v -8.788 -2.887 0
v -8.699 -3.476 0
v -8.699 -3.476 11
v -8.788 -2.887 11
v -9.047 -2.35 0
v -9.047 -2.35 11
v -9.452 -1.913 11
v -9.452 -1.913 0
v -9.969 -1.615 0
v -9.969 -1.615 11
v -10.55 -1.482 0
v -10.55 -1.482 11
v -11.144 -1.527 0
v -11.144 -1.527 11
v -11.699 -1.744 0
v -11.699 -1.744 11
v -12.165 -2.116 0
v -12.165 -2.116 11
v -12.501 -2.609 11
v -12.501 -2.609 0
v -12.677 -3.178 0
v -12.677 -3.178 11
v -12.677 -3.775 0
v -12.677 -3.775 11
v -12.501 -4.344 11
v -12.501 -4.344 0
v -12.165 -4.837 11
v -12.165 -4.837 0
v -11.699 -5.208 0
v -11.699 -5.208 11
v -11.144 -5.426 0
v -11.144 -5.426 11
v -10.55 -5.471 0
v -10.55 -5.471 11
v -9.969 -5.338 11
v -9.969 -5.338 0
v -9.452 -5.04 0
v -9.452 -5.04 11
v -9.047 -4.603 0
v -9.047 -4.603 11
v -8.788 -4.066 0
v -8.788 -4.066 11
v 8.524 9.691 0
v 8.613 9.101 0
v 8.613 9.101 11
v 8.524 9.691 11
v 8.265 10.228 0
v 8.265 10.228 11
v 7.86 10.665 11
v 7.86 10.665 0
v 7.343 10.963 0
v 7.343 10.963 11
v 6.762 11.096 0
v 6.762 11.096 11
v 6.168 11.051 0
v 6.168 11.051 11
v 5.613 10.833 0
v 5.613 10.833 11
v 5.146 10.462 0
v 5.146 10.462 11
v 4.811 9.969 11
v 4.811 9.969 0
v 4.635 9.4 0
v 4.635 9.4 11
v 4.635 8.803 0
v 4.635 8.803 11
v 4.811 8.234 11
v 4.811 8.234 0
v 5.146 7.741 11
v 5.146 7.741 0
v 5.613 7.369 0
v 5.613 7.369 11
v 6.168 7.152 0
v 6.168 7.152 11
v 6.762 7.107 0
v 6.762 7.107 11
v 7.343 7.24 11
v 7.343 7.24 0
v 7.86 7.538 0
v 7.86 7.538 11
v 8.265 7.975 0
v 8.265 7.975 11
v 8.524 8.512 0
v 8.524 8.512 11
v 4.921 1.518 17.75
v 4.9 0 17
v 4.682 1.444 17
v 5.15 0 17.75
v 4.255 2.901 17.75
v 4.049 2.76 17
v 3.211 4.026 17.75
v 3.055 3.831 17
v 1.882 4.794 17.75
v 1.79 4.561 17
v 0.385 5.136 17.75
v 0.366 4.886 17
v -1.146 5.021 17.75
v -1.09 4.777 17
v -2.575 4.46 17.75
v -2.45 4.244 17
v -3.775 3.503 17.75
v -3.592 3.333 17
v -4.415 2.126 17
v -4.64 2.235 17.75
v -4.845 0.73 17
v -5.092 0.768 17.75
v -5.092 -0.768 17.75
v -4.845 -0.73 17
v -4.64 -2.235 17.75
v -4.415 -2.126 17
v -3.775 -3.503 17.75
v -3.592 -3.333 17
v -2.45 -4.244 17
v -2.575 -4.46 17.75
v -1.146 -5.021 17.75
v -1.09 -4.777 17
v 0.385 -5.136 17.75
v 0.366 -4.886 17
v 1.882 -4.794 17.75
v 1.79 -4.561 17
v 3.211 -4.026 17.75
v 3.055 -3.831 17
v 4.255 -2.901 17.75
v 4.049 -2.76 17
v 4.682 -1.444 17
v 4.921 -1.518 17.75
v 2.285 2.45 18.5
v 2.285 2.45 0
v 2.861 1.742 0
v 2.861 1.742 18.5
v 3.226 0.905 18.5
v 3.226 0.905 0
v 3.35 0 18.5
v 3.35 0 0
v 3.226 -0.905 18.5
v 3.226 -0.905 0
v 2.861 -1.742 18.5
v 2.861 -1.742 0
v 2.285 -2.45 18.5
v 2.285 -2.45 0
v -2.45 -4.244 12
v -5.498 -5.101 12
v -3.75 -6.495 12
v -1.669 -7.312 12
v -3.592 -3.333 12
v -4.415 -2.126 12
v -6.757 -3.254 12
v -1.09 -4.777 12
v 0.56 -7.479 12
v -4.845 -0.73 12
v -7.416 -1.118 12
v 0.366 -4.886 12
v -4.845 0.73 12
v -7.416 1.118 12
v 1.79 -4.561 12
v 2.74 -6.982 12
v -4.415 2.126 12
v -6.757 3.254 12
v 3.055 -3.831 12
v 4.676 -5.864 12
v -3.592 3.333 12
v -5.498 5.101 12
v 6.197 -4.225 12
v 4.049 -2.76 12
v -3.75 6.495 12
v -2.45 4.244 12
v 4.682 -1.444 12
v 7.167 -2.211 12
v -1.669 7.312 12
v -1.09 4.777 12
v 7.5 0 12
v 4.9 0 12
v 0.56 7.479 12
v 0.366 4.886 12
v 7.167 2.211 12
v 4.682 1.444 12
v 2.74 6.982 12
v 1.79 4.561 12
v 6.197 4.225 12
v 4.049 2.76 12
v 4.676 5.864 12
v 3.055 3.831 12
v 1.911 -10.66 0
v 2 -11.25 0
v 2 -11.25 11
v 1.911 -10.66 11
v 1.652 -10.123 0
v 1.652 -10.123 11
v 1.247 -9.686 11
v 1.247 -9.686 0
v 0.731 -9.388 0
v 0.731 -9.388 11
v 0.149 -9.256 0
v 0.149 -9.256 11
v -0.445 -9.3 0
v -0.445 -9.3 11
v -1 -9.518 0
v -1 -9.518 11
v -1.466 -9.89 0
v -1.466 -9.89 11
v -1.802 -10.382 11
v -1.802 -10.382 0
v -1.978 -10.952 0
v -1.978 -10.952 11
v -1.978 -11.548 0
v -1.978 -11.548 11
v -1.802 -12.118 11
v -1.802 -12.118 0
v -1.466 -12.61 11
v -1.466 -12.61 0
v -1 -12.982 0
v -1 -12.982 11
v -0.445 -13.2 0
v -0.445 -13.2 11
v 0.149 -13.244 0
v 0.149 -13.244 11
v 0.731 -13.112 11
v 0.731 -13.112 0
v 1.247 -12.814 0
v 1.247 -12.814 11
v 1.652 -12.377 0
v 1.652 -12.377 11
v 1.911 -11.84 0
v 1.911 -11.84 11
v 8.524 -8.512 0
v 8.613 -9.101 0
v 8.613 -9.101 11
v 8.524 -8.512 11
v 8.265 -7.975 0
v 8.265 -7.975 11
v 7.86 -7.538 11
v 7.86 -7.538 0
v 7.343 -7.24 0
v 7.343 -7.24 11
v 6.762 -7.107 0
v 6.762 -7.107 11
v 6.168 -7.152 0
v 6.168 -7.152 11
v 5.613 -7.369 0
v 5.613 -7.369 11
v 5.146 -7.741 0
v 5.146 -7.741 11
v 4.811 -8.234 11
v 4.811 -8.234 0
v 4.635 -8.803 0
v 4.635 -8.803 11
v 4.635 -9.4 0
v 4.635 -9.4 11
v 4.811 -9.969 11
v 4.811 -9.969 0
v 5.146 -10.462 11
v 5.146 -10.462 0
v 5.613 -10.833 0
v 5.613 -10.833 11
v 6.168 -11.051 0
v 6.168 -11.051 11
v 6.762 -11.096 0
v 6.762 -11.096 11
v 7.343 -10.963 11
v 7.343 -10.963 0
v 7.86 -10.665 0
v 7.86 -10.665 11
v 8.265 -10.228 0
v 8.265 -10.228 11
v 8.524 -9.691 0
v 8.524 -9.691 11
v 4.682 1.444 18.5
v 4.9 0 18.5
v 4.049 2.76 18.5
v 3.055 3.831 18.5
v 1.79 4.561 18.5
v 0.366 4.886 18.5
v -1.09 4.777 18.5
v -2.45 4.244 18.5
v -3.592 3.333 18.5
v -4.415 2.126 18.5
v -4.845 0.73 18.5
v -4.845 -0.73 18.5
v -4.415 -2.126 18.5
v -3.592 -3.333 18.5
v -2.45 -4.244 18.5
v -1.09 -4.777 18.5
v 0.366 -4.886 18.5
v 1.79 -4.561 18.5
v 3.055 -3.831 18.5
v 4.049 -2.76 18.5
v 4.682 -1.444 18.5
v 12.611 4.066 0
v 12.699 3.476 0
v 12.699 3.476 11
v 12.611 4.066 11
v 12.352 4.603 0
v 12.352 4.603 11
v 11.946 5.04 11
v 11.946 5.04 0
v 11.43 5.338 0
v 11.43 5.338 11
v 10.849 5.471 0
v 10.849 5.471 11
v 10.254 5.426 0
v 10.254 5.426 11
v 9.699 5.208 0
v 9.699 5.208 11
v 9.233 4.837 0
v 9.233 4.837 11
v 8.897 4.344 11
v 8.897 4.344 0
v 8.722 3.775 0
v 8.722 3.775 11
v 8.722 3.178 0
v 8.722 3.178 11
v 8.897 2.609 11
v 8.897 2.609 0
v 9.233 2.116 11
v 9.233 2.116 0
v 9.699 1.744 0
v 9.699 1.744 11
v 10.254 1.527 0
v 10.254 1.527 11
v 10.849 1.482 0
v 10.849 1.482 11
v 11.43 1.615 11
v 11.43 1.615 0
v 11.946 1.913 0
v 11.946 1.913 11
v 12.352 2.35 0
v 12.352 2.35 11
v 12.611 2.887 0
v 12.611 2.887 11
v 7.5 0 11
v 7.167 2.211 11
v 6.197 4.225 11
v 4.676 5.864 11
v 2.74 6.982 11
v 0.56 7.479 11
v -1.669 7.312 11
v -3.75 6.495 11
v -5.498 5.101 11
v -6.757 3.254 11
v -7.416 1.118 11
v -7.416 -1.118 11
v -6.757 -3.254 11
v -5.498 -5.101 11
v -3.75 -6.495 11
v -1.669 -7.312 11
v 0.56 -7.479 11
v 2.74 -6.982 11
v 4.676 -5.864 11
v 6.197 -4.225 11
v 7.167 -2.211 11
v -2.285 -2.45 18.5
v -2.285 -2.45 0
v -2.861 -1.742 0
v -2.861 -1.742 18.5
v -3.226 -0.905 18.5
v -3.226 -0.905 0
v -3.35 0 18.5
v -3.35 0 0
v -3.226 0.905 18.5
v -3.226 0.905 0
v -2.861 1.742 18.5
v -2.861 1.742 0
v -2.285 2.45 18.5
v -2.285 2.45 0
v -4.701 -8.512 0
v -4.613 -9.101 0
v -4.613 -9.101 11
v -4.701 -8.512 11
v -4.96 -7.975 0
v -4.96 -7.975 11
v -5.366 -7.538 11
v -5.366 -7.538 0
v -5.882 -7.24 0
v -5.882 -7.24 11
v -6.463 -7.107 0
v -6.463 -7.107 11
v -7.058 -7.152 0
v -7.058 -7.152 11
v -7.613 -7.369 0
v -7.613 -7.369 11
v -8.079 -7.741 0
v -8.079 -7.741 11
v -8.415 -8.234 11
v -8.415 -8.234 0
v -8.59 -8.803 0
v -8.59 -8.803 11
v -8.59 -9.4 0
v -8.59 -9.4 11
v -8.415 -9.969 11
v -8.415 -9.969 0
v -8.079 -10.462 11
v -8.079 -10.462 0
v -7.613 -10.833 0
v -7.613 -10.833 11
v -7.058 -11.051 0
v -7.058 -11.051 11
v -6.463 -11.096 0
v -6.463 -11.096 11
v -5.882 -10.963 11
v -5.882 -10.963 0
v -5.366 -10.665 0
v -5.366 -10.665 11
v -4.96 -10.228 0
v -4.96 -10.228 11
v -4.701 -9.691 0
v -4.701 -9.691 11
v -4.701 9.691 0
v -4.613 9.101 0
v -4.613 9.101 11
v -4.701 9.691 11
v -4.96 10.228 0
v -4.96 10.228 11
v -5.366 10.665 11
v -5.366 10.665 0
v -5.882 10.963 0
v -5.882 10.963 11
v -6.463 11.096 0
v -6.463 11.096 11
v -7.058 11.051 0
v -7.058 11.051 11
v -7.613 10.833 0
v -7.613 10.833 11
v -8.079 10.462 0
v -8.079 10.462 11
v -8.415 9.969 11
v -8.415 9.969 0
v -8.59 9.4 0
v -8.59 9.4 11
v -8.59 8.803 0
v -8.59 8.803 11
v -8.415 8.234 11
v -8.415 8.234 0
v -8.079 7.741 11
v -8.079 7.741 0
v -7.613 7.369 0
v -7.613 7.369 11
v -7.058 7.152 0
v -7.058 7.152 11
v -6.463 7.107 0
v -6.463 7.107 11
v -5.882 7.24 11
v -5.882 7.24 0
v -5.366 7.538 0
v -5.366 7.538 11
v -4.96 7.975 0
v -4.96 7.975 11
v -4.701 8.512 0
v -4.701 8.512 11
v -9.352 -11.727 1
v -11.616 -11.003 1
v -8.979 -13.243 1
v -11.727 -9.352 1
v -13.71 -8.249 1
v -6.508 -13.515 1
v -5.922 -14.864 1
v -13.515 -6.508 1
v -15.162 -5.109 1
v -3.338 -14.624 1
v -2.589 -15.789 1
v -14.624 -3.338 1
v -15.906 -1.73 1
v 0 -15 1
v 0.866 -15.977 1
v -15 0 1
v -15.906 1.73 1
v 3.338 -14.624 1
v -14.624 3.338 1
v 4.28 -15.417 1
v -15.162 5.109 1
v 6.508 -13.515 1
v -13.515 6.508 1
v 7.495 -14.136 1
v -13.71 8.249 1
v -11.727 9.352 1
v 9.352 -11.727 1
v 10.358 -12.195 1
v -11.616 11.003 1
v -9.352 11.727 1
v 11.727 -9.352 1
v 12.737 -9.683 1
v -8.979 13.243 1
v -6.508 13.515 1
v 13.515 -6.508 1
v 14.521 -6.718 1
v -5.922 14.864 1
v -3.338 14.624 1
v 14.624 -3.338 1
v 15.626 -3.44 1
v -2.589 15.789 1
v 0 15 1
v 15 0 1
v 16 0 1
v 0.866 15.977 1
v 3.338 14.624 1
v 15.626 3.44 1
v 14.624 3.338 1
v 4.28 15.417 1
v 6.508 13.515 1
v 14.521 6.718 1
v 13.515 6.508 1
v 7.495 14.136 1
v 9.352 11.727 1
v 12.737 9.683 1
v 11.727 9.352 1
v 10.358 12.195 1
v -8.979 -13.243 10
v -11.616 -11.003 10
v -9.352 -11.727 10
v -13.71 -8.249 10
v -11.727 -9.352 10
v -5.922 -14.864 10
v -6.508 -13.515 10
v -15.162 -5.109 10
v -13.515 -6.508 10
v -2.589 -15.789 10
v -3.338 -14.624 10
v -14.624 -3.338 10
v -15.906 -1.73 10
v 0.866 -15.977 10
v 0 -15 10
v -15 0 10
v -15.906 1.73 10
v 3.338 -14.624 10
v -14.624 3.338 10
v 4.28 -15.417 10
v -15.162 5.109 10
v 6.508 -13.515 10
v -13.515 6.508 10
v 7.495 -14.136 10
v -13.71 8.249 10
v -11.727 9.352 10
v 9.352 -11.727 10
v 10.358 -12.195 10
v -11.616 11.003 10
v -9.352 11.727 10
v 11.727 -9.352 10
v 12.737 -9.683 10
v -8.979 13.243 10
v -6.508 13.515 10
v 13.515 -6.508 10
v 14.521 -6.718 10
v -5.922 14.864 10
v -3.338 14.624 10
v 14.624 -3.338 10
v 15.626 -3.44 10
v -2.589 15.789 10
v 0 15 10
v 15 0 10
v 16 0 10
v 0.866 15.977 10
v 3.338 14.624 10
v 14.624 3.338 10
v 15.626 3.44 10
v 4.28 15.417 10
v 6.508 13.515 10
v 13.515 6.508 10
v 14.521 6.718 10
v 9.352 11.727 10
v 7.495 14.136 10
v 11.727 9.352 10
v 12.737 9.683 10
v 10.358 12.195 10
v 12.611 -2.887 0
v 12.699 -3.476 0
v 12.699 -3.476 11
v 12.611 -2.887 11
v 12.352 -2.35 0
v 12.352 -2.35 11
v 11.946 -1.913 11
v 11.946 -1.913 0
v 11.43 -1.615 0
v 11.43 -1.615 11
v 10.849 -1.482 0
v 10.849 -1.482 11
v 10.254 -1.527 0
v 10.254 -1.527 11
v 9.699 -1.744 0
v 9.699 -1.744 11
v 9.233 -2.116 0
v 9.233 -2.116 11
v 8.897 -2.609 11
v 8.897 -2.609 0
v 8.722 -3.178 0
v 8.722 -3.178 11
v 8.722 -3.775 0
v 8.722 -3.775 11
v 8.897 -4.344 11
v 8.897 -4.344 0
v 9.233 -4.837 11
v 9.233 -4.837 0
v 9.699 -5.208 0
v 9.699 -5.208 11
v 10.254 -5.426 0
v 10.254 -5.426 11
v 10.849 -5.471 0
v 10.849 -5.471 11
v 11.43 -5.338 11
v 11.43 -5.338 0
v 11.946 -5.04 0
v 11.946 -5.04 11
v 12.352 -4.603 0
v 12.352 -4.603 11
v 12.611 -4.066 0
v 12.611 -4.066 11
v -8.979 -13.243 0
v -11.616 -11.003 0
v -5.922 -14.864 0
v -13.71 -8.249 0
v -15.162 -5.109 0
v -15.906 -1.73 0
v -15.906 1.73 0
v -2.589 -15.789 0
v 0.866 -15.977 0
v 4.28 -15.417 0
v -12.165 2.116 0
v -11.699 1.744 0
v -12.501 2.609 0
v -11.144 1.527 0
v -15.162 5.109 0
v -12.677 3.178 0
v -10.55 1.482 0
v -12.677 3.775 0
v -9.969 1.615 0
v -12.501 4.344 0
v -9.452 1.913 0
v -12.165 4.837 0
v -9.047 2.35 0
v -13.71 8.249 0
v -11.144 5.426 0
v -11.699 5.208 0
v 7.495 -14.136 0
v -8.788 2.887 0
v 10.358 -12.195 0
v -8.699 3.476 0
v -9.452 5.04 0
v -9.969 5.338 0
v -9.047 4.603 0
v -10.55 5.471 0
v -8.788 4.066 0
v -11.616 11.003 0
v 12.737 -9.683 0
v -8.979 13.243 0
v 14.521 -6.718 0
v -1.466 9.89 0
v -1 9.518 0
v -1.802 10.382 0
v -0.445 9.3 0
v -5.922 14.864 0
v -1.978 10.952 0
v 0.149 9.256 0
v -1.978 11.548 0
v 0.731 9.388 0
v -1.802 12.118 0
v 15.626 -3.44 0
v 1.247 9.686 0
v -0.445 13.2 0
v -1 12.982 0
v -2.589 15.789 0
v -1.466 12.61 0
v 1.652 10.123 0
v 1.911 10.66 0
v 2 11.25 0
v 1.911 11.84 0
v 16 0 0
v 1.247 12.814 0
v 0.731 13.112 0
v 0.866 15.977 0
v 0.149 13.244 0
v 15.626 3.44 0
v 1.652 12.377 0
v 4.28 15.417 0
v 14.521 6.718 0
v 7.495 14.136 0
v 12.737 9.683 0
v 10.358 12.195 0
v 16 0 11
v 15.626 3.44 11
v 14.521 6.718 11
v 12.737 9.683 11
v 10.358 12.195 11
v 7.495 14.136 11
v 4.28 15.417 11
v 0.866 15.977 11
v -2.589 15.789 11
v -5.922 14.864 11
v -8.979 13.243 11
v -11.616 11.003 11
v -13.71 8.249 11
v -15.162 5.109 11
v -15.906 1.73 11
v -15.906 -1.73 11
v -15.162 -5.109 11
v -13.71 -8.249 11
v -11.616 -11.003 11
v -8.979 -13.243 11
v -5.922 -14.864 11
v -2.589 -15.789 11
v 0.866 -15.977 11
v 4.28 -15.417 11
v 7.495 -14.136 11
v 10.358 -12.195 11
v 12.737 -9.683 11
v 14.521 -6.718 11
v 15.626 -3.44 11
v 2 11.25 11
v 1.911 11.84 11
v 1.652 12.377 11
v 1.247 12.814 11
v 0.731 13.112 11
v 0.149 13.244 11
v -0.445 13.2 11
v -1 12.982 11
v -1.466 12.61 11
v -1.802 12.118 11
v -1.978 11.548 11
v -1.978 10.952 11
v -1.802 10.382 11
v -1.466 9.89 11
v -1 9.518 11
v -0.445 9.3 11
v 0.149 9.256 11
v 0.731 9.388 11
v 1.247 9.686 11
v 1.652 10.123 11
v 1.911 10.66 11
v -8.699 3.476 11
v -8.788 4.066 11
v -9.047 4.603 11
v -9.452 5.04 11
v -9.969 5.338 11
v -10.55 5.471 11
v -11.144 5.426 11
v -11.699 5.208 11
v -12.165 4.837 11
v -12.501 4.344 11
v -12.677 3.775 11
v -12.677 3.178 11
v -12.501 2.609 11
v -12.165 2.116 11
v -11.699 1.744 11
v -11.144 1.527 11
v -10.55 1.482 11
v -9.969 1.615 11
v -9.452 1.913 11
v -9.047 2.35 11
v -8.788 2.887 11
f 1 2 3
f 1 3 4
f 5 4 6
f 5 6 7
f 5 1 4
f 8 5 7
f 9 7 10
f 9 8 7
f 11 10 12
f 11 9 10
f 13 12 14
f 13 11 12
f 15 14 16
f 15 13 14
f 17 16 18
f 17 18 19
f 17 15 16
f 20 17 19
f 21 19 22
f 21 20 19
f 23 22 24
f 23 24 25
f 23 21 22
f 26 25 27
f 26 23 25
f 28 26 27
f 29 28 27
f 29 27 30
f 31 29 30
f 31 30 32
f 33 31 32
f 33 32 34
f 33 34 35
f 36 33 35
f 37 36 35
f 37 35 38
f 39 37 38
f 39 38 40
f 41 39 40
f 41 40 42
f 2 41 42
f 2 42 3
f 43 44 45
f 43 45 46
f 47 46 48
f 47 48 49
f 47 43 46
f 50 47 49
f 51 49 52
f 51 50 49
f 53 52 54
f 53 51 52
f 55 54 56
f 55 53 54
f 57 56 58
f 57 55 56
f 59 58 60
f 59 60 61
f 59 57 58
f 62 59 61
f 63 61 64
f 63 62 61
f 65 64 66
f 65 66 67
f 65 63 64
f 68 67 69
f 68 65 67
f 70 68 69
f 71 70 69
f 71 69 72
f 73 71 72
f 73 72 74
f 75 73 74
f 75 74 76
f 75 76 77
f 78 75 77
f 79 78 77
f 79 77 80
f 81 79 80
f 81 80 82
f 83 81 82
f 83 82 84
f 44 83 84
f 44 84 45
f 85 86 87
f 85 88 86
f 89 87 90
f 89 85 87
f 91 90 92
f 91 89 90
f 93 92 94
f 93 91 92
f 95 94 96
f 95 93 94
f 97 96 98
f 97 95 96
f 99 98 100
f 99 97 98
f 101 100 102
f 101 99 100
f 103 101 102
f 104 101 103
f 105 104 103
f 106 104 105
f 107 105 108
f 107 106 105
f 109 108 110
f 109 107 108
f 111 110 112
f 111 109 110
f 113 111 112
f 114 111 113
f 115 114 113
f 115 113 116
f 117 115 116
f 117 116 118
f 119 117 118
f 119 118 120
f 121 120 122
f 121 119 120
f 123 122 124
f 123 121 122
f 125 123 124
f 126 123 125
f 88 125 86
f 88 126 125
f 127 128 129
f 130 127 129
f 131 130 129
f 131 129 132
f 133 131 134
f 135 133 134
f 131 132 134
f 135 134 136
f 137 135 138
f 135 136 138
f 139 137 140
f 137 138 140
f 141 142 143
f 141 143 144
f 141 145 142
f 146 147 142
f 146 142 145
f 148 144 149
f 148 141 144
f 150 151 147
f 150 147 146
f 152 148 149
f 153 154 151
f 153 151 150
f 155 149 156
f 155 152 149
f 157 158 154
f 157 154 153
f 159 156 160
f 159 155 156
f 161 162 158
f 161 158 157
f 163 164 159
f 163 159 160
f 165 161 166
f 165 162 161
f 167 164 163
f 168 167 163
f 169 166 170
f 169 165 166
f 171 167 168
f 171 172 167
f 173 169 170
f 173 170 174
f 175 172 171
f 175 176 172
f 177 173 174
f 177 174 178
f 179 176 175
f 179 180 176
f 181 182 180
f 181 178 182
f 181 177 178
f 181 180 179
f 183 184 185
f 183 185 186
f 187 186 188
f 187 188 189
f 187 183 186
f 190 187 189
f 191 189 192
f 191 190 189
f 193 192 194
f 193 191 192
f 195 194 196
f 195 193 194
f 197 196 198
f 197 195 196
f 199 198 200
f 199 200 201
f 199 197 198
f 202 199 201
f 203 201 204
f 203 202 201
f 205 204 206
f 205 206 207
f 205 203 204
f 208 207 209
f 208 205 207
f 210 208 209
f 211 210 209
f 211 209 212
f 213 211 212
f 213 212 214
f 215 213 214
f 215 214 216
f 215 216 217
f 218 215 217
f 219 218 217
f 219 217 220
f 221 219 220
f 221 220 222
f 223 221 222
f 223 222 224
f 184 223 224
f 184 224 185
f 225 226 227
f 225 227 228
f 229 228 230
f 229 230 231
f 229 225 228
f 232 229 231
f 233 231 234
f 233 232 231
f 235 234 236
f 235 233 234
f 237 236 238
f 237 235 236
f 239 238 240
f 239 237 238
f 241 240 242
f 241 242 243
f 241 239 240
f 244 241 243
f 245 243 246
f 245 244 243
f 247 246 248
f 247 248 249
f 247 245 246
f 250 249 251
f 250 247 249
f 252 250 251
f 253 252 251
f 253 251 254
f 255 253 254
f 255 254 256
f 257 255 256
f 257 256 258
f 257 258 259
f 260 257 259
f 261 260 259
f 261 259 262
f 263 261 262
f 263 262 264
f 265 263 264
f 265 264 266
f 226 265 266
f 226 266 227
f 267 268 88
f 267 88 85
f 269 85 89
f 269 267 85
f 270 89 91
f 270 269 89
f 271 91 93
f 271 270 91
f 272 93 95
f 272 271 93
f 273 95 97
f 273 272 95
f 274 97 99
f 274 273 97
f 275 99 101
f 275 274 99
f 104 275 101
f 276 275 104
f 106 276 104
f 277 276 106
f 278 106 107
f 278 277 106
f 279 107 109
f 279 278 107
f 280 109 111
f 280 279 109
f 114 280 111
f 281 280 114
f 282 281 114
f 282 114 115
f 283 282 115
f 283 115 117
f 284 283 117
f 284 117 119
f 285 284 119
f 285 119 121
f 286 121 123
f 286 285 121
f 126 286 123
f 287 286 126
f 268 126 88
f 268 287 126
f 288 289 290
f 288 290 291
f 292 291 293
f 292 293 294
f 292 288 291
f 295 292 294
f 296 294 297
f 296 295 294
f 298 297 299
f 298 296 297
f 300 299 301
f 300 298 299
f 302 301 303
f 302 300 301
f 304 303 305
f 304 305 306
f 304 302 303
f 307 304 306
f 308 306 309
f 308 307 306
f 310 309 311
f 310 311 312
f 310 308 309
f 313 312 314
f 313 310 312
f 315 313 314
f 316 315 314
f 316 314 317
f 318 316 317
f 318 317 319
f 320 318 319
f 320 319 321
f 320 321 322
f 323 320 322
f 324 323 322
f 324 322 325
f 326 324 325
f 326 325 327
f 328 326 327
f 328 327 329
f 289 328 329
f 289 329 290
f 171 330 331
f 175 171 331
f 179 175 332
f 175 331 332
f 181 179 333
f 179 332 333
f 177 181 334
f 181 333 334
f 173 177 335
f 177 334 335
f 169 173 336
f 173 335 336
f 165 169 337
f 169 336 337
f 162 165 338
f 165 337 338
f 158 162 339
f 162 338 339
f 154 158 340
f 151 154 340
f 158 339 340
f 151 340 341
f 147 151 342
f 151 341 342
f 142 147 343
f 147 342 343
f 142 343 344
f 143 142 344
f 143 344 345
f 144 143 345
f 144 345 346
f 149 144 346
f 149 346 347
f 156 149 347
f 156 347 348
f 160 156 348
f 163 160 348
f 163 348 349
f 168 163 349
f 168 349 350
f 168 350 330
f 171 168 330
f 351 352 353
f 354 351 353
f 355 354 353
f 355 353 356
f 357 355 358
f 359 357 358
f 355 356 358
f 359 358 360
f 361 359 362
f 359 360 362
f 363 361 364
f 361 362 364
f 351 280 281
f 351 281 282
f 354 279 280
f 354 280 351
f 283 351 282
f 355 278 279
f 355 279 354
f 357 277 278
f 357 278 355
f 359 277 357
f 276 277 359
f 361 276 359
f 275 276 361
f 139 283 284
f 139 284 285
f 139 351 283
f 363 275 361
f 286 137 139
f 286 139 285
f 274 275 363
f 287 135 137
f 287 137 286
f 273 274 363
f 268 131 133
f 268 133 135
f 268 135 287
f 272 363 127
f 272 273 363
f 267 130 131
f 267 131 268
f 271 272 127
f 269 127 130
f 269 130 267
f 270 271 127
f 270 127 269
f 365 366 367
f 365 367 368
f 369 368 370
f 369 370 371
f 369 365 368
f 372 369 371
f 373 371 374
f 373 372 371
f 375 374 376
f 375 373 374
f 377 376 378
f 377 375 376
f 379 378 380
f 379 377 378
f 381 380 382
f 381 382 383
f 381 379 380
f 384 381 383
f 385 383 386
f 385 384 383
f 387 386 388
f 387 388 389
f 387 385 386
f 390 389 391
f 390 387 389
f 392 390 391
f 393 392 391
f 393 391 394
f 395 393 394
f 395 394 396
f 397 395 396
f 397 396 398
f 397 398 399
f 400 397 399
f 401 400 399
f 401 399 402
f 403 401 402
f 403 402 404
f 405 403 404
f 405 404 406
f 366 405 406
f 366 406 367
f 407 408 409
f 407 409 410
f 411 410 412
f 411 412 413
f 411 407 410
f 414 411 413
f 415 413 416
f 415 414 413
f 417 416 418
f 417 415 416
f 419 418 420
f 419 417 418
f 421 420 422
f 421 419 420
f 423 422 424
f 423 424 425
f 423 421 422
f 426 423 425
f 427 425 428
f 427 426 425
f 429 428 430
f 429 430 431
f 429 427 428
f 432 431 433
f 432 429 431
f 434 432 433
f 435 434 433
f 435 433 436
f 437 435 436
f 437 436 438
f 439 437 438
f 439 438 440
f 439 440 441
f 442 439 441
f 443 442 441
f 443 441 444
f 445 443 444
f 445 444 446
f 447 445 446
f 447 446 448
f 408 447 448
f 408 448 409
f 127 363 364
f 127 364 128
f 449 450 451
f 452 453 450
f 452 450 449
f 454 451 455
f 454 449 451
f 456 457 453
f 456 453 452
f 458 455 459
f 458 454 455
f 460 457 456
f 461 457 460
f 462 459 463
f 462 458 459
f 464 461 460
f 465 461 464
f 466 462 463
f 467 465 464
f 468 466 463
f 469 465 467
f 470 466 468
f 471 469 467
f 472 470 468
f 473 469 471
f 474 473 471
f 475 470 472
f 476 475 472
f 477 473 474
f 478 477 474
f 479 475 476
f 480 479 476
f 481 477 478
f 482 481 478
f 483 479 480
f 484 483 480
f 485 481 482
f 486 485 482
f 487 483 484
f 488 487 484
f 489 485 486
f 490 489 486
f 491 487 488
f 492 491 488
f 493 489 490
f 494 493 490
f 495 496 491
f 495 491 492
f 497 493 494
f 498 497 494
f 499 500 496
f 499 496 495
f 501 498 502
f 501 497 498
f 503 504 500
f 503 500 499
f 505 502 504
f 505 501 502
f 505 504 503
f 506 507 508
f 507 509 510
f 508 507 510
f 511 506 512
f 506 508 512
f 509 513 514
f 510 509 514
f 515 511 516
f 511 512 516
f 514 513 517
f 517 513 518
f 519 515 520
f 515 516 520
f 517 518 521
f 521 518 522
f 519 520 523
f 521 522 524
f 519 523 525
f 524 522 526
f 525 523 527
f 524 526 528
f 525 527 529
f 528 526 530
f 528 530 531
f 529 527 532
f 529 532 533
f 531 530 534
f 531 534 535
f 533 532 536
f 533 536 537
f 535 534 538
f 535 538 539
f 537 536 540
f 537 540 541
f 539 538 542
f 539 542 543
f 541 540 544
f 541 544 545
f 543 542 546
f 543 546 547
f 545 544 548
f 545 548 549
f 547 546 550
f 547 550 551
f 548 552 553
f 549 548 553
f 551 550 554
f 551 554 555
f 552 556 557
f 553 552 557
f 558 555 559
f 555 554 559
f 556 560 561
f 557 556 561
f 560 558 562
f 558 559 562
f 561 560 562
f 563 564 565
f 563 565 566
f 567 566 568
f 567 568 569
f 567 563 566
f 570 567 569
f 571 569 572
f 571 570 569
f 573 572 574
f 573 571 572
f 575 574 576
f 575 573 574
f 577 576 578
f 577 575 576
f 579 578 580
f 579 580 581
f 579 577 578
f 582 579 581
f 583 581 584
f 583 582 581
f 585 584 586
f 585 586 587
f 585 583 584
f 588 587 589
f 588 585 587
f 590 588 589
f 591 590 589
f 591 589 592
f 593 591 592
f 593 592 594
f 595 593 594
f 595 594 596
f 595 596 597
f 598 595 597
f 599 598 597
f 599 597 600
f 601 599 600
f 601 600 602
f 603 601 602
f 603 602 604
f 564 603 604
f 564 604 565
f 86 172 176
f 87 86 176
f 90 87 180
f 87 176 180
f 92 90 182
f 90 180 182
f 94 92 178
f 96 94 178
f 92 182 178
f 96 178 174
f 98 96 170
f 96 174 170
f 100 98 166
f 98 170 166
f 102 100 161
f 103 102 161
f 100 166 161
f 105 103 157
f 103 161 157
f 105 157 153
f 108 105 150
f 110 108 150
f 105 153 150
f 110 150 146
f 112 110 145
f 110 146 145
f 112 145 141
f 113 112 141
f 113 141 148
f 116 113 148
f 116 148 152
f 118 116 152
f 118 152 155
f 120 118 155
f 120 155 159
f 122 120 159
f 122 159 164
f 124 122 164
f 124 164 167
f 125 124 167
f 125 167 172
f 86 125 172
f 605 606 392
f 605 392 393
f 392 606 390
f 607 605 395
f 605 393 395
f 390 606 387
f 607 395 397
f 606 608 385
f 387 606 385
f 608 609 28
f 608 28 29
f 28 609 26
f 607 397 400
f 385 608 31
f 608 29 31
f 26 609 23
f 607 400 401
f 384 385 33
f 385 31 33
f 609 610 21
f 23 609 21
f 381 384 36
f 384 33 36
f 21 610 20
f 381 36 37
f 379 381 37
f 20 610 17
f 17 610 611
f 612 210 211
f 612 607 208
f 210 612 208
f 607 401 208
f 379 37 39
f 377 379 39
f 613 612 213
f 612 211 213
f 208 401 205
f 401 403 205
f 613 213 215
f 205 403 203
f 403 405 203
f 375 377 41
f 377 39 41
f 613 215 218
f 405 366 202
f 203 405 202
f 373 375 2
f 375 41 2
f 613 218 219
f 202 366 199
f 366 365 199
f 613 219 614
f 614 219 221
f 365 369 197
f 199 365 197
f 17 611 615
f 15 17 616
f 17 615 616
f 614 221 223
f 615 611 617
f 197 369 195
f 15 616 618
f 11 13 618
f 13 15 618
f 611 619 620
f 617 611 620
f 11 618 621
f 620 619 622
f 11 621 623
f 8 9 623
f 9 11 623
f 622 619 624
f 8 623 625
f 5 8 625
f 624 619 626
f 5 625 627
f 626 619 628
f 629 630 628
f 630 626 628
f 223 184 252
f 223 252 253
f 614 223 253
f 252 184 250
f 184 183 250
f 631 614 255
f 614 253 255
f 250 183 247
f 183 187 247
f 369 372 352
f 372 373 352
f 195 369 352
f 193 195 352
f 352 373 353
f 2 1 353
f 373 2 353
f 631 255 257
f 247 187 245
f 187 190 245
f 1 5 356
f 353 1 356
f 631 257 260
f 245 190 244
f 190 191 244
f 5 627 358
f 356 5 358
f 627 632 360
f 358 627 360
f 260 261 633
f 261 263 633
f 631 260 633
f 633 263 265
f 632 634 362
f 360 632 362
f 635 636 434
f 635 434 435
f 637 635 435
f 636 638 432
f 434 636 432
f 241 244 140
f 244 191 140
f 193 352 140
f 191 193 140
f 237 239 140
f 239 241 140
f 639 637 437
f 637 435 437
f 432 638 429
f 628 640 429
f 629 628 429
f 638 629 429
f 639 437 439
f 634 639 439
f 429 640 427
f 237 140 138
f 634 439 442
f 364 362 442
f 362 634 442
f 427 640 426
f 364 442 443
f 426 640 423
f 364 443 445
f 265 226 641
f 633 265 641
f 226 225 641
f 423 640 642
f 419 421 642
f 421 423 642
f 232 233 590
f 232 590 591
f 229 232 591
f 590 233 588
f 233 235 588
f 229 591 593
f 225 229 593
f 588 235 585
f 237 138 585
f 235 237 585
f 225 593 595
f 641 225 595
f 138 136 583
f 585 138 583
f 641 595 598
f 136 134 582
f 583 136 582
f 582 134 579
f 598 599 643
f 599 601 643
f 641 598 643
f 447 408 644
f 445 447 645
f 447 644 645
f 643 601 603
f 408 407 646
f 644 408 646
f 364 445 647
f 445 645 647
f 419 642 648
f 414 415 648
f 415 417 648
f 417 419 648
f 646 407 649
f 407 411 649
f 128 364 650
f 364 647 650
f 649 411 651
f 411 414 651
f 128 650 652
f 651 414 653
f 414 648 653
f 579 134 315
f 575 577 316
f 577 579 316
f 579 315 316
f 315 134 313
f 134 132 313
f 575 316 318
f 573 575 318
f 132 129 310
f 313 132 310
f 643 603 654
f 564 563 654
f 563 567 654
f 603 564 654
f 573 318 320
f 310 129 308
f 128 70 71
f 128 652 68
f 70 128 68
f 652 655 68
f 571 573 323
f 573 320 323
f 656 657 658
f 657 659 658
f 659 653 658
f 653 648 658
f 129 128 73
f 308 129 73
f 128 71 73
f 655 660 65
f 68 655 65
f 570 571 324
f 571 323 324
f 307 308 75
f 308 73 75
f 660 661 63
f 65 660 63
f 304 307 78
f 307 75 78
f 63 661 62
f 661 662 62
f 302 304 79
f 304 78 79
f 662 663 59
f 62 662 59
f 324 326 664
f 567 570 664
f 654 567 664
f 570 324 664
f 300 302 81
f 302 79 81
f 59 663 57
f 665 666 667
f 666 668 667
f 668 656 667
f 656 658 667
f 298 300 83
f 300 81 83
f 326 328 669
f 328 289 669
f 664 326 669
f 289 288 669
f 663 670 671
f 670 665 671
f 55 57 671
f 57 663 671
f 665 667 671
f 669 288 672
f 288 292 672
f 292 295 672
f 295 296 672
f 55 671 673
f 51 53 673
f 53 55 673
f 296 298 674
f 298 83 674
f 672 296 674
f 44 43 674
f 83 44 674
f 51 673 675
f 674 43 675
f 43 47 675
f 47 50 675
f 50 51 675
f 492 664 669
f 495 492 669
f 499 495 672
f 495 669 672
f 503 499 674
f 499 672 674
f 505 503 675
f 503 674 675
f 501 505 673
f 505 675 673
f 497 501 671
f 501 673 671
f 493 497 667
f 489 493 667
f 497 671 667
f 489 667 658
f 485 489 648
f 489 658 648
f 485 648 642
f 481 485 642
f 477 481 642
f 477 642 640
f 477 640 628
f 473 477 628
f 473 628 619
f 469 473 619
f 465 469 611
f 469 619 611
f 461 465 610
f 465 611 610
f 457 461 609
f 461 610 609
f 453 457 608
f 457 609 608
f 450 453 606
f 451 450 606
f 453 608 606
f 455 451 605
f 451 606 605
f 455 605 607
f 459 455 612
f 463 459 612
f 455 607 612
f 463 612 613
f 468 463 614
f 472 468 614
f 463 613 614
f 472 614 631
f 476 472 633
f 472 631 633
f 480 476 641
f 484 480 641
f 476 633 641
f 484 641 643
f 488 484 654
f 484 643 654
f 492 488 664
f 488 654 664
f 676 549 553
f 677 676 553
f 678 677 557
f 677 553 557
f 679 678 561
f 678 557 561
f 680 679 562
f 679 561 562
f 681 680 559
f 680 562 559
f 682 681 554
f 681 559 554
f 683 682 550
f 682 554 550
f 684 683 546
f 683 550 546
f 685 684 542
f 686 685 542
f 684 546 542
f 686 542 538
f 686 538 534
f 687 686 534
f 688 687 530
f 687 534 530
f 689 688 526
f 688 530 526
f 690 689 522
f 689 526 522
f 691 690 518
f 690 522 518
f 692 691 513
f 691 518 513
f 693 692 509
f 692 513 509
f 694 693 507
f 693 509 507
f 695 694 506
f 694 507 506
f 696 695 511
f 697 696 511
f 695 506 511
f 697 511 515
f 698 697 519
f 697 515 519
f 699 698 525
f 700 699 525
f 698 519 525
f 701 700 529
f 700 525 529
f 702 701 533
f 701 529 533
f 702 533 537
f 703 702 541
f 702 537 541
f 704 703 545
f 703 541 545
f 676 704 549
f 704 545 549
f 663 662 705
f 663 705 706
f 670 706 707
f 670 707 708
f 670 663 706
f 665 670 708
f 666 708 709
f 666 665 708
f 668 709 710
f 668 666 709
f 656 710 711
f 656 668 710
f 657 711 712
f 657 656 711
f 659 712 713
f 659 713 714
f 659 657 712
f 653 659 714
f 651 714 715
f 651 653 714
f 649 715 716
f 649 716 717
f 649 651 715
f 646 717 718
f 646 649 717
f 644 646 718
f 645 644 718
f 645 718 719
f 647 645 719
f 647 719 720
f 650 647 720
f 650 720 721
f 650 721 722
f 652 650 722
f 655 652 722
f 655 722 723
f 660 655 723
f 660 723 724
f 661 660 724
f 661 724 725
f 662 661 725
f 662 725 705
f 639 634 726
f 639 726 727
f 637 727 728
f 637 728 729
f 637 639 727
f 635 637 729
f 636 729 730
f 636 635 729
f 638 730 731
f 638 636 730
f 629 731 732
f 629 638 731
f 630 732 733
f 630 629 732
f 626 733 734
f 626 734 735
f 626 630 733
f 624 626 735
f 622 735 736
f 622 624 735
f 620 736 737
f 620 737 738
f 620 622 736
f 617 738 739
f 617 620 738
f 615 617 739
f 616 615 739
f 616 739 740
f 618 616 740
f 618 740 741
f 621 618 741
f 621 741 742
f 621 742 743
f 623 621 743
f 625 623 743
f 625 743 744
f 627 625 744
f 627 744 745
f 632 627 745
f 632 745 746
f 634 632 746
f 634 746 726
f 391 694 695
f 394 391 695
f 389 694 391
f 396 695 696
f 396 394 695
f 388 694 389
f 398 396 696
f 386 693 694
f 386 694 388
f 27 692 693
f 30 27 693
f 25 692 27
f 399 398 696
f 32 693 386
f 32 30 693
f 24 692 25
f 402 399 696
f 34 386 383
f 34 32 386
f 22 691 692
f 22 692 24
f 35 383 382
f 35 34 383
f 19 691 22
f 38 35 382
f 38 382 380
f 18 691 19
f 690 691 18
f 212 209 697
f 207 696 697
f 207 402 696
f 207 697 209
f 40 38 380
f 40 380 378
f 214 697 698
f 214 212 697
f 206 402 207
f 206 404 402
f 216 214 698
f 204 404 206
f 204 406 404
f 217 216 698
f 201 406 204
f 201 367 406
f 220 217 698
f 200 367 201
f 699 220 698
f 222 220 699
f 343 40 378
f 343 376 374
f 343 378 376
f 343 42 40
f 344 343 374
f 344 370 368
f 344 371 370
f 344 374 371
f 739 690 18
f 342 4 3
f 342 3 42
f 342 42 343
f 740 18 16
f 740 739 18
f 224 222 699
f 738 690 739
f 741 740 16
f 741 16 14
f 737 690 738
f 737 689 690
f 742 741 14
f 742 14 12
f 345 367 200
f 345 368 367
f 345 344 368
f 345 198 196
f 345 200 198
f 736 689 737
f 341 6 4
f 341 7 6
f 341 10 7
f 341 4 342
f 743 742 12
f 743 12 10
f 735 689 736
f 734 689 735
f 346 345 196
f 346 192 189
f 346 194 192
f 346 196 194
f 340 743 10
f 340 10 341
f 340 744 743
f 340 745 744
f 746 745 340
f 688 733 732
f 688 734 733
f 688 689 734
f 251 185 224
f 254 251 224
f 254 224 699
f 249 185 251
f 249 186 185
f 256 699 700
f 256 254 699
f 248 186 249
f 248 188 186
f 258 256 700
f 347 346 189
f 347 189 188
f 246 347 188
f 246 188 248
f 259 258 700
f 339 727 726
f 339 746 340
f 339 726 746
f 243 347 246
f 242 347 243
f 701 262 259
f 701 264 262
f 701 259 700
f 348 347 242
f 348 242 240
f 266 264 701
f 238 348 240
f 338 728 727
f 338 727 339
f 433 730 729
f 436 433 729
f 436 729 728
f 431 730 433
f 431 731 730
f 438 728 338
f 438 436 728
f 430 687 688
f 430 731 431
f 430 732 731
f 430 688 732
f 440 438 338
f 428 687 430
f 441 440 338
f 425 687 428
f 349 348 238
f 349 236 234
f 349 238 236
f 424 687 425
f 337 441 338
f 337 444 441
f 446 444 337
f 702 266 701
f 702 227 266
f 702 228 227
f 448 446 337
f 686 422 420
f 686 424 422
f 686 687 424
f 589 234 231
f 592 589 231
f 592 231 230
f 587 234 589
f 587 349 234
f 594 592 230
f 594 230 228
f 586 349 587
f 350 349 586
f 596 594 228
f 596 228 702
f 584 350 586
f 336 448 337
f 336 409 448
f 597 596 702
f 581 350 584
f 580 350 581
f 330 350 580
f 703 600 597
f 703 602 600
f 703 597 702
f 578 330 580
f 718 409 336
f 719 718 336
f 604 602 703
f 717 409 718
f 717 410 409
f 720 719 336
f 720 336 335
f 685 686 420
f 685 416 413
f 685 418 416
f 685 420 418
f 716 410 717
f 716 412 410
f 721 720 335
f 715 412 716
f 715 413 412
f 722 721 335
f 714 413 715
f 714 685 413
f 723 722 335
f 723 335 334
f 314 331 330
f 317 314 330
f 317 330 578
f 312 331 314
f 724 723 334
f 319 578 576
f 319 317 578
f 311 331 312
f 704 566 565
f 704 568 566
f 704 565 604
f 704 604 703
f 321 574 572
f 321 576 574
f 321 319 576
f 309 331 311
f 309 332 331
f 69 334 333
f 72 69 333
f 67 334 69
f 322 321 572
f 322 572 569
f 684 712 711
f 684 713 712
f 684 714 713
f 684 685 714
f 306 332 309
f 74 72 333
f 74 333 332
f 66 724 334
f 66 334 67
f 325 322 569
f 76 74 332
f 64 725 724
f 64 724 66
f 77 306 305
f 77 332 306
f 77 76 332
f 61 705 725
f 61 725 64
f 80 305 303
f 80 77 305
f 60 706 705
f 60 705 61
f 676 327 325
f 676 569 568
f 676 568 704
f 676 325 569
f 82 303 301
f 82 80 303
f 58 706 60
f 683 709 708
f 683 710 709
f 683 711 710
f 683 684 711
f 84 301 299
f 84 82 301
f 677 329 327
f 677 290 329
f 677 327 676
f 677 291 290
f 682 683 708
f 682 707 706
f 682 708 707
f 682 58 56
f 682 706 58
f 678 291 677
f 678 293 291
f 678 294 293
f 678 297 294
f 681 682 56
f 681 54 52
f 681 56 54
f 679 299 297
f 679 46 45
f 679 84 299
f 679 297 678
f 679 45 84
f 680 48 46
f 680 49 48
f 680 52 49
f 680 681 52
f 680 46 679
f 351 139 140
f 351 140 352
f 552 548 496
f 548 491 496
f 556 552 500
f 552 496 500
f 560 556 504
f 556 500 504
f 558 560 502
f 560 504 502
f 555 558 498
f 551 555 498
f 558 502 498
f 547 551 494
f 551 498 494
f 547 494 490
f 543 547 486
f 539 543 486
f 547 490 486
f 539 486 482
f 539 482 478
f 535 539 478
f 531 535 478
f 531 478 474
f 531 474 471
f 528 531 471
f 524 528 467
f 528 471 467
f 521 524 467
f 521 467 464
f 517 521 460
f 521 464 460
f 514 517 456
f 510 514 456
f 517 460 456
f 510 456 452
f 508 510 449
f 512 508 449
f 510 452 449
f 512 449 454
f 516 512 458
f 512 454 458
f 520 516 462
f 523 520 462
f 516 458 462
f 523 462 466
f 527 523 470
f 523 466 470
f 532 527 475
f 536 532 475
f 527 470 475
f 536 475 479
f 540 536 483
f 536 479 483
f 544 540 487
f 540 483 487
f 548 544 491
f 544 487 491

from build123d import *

# Parameters (mm, degrees)
F2_R         = 15
F2_R_2       = 2
F2_R_3       = 7.5
F2_R_4       = 4.9
F3_DEPTH     = 11
F4_DEPTH     = 9
F5_DEPTH     = 18.5
F2_R_5       = 16
F10_DEPTH    = 1
F11_START    = 9
F10_FACE_R   = 16
F10_FACE_R_2 = 15
F11_DEPTH    = 1
F12_DEPTH    = 12


with BuildPart() as f3:
    # F2 (on Top) → F3 (new body)
    with BuildSketch(Plane.XY):
        Circle(F2_R)
        with Locations((-6.6125840883, -9.1014411867)):
            Circle(F2_R_2, mode=Mode.SUBTRACT)
        with Locations((-10.6993858083, -3.4764411867)):
            Circle(F2_R_2, mode=Mode.SUBTRACT)
        with Locations((0, -11.25)):
            Circle(F2_R_2, mode=Mode.SUBTRACT)
        with Locations((6.6125840883, -9.1014411867)):
            Circle(F2_R_2, mode=Mode.SUBTRACT)
        with Locations((10.6993858083, -3.4764411867)):
            Circle(F2_R_2, mode=Mode.SUBTRACT)
        with Locations((-10.6993858083, 3.4764411867)):
            Circle(F2_R_2, mode=Mode.SUBTRACT)
        with Locations((-6.6125840883, 9.1014411867)):
            Circle(F2_R_2, mode=Mode.SUBTRACT)
        Circle(F2_R_3, mode=Mode.SUBTRACT)
        with Locations((10.6993858083, 3.4764411867)):
            Circle(F2_R_2, mode=Mode.SUBTRACT)
        with Locations((0, 11.25)):
            Circle(F2_R_2, mode=Mode.SUBTRACT)
        with Locations((6.6125840883, 9.1014411867)):
            Circle(F2_R_2, mode=Mode.SUBTRACT)
        Circle(F2_R_3)
        Circle(F2_R_4, mode=Mode.SUBTRACT)
        Circle(F2_R_4)
        with BuildLine():
            ThreePointArc((-2.2847319318, -2.45), (-3.35, 0), (-2.2847319318, 2.45))
            Line((-2.2847319318, 2.45), (2.2847319318, 2.45))
            ThreePointArc((2.2847319318, 2.45), (3.35, 0), (2.2847319318, -2.45))
            Line((2.2847319318, -2.45), (-2.2847319318, -2.45))
        make_face(mode=Mode.SUBTRACT)
    extrude(amount=F3_DEPTH)

    # F2 (on Top) → F4 (join)
    with BuildSketch(Plane.XY):
        Circle(F2_R_3)
        Circle(F2_R_4, mode=Mode.SUBTRACT)
        Circle(F2_R_4)
        with BuildLine():
            ThreePointArc((-2.2847319318, -2.45), (-3.35, 0), (-2.2847319318, 2.45))
            Line((-2.2847319318, 2.45), (2.2847319318, 2.45))
            ThreePointArc((2.2847319318, 2.45), (3.35, 0), (2.2847319318, -2.45))
            Line((2.2847319318, -2.45), (-2.2847319318, -2.45))
        make_face(mode=Mode.SUBTRACT)
    extrude(amount=F4_DEPTH)

    # F2 (on Top) → F5 (join)
    with BuildSketch(Plane.XY):
        Circle(F2_R_4)
        with BuildLine():
            ThreePointArc((-2.2847319318, -2.45), (-3.35, 0), (-2.2847319318, 2.45))
            Line((-2.2847319318, 2.45), (2.2847319318, 2.45))
            ThreePointArc((2.2847319318, 2.45), (3.35, 0), (2.2847319318, -2.45))
            Line((2.2847319318, -2.45), (-2.2847319318, -2.45))
        make_face(mode=Mode.SUBTRACT)
    extrude(amount=F5_DEPTH)

    # F6 (on Front) → F7 (revolve)
    with BuildSketch(Plane.XZ):
        Polygon((5.15, 17.75), (4.9, 18.5), (4.9, 17), align=None)
    revolve(axis=Axis((0, 0, 8.7542282417), (0, 0, 1)))

    # F2 (on Top) → F10 (join)
    with BuildSketch(Plane.XY):
        Circle(F2_R_5)
        Circle(F2_R, mode=Mode.SUBTRACT)
    extrude(amount=F10_DEPTH)

    # F2 (on Top) + F10_face (on face) → F11 (join)
    with BuildSketch(Plane.XY.offset(F11_START)):
        Circle(F2_R)
        with Locations((-6.6125840883, -9.1014411867)):
            Circle(F2_R_2, mode=Mode.SUBTRACT)
        with Locations((-10.6993858083, -3.4764411867)):
            Circle(F2_R_2, mode=Mode.SUBTRACT)
        with Locations((0, -11.25)):
            Circle(F2_R_2, mode=Mode.SUBTRACT)
        with Locations((6.6125840883, -9.1014411867)):
            Circle(F2_R_2, mode=Mode.SUBTRACT)
        with Locations((10.6993858083, -3.4764411867)):
            Circle(F2_R_2, mode=Mode.SUBTRACT)
        with Locations((-10.6993858083, 3.4764411867)):
            Circle(F2_R_2, mode=Mode.SUBTRACT)
        with Locations((-6.6125840883, 9.1014411867)):
            Circle(F2_R_2, mode=Mode.SUBTRACT)
        Circle(F2_R_3, mode=Mode.SUBTRACT)
        with Locations((10.6993858083, 3.4764411867)):
            Circle(F2_R_2, mode=Mode.SUBTRACT)
        with Locations((0, 11.25)):
            Circle(F2_R_2, mode=Mode.SUBTRACT)
        with Locations((6.6125840883, 9.1014411867)):
            Circle(F2_R_2, mode=Mode.SUBTRACT)
    with BuildSketch(Plane.XY.offset(1).offset(F11_START)):
        Circle(F10_FACE_R)
        Circle(F10_FACE_R_2, mode=Mode.SUBTRACT)
    extrude(amount=F11_DEPTH)

    # F2 (on Top) → F12 (join)
    with BuildSketch(Plane.XY):
        Circle(F2_R_3)
        Circle(F2_R_4, mode=Mode.SUBTRACT)
    extrude(amount=F12_DEPTH)


solid = f3.part
